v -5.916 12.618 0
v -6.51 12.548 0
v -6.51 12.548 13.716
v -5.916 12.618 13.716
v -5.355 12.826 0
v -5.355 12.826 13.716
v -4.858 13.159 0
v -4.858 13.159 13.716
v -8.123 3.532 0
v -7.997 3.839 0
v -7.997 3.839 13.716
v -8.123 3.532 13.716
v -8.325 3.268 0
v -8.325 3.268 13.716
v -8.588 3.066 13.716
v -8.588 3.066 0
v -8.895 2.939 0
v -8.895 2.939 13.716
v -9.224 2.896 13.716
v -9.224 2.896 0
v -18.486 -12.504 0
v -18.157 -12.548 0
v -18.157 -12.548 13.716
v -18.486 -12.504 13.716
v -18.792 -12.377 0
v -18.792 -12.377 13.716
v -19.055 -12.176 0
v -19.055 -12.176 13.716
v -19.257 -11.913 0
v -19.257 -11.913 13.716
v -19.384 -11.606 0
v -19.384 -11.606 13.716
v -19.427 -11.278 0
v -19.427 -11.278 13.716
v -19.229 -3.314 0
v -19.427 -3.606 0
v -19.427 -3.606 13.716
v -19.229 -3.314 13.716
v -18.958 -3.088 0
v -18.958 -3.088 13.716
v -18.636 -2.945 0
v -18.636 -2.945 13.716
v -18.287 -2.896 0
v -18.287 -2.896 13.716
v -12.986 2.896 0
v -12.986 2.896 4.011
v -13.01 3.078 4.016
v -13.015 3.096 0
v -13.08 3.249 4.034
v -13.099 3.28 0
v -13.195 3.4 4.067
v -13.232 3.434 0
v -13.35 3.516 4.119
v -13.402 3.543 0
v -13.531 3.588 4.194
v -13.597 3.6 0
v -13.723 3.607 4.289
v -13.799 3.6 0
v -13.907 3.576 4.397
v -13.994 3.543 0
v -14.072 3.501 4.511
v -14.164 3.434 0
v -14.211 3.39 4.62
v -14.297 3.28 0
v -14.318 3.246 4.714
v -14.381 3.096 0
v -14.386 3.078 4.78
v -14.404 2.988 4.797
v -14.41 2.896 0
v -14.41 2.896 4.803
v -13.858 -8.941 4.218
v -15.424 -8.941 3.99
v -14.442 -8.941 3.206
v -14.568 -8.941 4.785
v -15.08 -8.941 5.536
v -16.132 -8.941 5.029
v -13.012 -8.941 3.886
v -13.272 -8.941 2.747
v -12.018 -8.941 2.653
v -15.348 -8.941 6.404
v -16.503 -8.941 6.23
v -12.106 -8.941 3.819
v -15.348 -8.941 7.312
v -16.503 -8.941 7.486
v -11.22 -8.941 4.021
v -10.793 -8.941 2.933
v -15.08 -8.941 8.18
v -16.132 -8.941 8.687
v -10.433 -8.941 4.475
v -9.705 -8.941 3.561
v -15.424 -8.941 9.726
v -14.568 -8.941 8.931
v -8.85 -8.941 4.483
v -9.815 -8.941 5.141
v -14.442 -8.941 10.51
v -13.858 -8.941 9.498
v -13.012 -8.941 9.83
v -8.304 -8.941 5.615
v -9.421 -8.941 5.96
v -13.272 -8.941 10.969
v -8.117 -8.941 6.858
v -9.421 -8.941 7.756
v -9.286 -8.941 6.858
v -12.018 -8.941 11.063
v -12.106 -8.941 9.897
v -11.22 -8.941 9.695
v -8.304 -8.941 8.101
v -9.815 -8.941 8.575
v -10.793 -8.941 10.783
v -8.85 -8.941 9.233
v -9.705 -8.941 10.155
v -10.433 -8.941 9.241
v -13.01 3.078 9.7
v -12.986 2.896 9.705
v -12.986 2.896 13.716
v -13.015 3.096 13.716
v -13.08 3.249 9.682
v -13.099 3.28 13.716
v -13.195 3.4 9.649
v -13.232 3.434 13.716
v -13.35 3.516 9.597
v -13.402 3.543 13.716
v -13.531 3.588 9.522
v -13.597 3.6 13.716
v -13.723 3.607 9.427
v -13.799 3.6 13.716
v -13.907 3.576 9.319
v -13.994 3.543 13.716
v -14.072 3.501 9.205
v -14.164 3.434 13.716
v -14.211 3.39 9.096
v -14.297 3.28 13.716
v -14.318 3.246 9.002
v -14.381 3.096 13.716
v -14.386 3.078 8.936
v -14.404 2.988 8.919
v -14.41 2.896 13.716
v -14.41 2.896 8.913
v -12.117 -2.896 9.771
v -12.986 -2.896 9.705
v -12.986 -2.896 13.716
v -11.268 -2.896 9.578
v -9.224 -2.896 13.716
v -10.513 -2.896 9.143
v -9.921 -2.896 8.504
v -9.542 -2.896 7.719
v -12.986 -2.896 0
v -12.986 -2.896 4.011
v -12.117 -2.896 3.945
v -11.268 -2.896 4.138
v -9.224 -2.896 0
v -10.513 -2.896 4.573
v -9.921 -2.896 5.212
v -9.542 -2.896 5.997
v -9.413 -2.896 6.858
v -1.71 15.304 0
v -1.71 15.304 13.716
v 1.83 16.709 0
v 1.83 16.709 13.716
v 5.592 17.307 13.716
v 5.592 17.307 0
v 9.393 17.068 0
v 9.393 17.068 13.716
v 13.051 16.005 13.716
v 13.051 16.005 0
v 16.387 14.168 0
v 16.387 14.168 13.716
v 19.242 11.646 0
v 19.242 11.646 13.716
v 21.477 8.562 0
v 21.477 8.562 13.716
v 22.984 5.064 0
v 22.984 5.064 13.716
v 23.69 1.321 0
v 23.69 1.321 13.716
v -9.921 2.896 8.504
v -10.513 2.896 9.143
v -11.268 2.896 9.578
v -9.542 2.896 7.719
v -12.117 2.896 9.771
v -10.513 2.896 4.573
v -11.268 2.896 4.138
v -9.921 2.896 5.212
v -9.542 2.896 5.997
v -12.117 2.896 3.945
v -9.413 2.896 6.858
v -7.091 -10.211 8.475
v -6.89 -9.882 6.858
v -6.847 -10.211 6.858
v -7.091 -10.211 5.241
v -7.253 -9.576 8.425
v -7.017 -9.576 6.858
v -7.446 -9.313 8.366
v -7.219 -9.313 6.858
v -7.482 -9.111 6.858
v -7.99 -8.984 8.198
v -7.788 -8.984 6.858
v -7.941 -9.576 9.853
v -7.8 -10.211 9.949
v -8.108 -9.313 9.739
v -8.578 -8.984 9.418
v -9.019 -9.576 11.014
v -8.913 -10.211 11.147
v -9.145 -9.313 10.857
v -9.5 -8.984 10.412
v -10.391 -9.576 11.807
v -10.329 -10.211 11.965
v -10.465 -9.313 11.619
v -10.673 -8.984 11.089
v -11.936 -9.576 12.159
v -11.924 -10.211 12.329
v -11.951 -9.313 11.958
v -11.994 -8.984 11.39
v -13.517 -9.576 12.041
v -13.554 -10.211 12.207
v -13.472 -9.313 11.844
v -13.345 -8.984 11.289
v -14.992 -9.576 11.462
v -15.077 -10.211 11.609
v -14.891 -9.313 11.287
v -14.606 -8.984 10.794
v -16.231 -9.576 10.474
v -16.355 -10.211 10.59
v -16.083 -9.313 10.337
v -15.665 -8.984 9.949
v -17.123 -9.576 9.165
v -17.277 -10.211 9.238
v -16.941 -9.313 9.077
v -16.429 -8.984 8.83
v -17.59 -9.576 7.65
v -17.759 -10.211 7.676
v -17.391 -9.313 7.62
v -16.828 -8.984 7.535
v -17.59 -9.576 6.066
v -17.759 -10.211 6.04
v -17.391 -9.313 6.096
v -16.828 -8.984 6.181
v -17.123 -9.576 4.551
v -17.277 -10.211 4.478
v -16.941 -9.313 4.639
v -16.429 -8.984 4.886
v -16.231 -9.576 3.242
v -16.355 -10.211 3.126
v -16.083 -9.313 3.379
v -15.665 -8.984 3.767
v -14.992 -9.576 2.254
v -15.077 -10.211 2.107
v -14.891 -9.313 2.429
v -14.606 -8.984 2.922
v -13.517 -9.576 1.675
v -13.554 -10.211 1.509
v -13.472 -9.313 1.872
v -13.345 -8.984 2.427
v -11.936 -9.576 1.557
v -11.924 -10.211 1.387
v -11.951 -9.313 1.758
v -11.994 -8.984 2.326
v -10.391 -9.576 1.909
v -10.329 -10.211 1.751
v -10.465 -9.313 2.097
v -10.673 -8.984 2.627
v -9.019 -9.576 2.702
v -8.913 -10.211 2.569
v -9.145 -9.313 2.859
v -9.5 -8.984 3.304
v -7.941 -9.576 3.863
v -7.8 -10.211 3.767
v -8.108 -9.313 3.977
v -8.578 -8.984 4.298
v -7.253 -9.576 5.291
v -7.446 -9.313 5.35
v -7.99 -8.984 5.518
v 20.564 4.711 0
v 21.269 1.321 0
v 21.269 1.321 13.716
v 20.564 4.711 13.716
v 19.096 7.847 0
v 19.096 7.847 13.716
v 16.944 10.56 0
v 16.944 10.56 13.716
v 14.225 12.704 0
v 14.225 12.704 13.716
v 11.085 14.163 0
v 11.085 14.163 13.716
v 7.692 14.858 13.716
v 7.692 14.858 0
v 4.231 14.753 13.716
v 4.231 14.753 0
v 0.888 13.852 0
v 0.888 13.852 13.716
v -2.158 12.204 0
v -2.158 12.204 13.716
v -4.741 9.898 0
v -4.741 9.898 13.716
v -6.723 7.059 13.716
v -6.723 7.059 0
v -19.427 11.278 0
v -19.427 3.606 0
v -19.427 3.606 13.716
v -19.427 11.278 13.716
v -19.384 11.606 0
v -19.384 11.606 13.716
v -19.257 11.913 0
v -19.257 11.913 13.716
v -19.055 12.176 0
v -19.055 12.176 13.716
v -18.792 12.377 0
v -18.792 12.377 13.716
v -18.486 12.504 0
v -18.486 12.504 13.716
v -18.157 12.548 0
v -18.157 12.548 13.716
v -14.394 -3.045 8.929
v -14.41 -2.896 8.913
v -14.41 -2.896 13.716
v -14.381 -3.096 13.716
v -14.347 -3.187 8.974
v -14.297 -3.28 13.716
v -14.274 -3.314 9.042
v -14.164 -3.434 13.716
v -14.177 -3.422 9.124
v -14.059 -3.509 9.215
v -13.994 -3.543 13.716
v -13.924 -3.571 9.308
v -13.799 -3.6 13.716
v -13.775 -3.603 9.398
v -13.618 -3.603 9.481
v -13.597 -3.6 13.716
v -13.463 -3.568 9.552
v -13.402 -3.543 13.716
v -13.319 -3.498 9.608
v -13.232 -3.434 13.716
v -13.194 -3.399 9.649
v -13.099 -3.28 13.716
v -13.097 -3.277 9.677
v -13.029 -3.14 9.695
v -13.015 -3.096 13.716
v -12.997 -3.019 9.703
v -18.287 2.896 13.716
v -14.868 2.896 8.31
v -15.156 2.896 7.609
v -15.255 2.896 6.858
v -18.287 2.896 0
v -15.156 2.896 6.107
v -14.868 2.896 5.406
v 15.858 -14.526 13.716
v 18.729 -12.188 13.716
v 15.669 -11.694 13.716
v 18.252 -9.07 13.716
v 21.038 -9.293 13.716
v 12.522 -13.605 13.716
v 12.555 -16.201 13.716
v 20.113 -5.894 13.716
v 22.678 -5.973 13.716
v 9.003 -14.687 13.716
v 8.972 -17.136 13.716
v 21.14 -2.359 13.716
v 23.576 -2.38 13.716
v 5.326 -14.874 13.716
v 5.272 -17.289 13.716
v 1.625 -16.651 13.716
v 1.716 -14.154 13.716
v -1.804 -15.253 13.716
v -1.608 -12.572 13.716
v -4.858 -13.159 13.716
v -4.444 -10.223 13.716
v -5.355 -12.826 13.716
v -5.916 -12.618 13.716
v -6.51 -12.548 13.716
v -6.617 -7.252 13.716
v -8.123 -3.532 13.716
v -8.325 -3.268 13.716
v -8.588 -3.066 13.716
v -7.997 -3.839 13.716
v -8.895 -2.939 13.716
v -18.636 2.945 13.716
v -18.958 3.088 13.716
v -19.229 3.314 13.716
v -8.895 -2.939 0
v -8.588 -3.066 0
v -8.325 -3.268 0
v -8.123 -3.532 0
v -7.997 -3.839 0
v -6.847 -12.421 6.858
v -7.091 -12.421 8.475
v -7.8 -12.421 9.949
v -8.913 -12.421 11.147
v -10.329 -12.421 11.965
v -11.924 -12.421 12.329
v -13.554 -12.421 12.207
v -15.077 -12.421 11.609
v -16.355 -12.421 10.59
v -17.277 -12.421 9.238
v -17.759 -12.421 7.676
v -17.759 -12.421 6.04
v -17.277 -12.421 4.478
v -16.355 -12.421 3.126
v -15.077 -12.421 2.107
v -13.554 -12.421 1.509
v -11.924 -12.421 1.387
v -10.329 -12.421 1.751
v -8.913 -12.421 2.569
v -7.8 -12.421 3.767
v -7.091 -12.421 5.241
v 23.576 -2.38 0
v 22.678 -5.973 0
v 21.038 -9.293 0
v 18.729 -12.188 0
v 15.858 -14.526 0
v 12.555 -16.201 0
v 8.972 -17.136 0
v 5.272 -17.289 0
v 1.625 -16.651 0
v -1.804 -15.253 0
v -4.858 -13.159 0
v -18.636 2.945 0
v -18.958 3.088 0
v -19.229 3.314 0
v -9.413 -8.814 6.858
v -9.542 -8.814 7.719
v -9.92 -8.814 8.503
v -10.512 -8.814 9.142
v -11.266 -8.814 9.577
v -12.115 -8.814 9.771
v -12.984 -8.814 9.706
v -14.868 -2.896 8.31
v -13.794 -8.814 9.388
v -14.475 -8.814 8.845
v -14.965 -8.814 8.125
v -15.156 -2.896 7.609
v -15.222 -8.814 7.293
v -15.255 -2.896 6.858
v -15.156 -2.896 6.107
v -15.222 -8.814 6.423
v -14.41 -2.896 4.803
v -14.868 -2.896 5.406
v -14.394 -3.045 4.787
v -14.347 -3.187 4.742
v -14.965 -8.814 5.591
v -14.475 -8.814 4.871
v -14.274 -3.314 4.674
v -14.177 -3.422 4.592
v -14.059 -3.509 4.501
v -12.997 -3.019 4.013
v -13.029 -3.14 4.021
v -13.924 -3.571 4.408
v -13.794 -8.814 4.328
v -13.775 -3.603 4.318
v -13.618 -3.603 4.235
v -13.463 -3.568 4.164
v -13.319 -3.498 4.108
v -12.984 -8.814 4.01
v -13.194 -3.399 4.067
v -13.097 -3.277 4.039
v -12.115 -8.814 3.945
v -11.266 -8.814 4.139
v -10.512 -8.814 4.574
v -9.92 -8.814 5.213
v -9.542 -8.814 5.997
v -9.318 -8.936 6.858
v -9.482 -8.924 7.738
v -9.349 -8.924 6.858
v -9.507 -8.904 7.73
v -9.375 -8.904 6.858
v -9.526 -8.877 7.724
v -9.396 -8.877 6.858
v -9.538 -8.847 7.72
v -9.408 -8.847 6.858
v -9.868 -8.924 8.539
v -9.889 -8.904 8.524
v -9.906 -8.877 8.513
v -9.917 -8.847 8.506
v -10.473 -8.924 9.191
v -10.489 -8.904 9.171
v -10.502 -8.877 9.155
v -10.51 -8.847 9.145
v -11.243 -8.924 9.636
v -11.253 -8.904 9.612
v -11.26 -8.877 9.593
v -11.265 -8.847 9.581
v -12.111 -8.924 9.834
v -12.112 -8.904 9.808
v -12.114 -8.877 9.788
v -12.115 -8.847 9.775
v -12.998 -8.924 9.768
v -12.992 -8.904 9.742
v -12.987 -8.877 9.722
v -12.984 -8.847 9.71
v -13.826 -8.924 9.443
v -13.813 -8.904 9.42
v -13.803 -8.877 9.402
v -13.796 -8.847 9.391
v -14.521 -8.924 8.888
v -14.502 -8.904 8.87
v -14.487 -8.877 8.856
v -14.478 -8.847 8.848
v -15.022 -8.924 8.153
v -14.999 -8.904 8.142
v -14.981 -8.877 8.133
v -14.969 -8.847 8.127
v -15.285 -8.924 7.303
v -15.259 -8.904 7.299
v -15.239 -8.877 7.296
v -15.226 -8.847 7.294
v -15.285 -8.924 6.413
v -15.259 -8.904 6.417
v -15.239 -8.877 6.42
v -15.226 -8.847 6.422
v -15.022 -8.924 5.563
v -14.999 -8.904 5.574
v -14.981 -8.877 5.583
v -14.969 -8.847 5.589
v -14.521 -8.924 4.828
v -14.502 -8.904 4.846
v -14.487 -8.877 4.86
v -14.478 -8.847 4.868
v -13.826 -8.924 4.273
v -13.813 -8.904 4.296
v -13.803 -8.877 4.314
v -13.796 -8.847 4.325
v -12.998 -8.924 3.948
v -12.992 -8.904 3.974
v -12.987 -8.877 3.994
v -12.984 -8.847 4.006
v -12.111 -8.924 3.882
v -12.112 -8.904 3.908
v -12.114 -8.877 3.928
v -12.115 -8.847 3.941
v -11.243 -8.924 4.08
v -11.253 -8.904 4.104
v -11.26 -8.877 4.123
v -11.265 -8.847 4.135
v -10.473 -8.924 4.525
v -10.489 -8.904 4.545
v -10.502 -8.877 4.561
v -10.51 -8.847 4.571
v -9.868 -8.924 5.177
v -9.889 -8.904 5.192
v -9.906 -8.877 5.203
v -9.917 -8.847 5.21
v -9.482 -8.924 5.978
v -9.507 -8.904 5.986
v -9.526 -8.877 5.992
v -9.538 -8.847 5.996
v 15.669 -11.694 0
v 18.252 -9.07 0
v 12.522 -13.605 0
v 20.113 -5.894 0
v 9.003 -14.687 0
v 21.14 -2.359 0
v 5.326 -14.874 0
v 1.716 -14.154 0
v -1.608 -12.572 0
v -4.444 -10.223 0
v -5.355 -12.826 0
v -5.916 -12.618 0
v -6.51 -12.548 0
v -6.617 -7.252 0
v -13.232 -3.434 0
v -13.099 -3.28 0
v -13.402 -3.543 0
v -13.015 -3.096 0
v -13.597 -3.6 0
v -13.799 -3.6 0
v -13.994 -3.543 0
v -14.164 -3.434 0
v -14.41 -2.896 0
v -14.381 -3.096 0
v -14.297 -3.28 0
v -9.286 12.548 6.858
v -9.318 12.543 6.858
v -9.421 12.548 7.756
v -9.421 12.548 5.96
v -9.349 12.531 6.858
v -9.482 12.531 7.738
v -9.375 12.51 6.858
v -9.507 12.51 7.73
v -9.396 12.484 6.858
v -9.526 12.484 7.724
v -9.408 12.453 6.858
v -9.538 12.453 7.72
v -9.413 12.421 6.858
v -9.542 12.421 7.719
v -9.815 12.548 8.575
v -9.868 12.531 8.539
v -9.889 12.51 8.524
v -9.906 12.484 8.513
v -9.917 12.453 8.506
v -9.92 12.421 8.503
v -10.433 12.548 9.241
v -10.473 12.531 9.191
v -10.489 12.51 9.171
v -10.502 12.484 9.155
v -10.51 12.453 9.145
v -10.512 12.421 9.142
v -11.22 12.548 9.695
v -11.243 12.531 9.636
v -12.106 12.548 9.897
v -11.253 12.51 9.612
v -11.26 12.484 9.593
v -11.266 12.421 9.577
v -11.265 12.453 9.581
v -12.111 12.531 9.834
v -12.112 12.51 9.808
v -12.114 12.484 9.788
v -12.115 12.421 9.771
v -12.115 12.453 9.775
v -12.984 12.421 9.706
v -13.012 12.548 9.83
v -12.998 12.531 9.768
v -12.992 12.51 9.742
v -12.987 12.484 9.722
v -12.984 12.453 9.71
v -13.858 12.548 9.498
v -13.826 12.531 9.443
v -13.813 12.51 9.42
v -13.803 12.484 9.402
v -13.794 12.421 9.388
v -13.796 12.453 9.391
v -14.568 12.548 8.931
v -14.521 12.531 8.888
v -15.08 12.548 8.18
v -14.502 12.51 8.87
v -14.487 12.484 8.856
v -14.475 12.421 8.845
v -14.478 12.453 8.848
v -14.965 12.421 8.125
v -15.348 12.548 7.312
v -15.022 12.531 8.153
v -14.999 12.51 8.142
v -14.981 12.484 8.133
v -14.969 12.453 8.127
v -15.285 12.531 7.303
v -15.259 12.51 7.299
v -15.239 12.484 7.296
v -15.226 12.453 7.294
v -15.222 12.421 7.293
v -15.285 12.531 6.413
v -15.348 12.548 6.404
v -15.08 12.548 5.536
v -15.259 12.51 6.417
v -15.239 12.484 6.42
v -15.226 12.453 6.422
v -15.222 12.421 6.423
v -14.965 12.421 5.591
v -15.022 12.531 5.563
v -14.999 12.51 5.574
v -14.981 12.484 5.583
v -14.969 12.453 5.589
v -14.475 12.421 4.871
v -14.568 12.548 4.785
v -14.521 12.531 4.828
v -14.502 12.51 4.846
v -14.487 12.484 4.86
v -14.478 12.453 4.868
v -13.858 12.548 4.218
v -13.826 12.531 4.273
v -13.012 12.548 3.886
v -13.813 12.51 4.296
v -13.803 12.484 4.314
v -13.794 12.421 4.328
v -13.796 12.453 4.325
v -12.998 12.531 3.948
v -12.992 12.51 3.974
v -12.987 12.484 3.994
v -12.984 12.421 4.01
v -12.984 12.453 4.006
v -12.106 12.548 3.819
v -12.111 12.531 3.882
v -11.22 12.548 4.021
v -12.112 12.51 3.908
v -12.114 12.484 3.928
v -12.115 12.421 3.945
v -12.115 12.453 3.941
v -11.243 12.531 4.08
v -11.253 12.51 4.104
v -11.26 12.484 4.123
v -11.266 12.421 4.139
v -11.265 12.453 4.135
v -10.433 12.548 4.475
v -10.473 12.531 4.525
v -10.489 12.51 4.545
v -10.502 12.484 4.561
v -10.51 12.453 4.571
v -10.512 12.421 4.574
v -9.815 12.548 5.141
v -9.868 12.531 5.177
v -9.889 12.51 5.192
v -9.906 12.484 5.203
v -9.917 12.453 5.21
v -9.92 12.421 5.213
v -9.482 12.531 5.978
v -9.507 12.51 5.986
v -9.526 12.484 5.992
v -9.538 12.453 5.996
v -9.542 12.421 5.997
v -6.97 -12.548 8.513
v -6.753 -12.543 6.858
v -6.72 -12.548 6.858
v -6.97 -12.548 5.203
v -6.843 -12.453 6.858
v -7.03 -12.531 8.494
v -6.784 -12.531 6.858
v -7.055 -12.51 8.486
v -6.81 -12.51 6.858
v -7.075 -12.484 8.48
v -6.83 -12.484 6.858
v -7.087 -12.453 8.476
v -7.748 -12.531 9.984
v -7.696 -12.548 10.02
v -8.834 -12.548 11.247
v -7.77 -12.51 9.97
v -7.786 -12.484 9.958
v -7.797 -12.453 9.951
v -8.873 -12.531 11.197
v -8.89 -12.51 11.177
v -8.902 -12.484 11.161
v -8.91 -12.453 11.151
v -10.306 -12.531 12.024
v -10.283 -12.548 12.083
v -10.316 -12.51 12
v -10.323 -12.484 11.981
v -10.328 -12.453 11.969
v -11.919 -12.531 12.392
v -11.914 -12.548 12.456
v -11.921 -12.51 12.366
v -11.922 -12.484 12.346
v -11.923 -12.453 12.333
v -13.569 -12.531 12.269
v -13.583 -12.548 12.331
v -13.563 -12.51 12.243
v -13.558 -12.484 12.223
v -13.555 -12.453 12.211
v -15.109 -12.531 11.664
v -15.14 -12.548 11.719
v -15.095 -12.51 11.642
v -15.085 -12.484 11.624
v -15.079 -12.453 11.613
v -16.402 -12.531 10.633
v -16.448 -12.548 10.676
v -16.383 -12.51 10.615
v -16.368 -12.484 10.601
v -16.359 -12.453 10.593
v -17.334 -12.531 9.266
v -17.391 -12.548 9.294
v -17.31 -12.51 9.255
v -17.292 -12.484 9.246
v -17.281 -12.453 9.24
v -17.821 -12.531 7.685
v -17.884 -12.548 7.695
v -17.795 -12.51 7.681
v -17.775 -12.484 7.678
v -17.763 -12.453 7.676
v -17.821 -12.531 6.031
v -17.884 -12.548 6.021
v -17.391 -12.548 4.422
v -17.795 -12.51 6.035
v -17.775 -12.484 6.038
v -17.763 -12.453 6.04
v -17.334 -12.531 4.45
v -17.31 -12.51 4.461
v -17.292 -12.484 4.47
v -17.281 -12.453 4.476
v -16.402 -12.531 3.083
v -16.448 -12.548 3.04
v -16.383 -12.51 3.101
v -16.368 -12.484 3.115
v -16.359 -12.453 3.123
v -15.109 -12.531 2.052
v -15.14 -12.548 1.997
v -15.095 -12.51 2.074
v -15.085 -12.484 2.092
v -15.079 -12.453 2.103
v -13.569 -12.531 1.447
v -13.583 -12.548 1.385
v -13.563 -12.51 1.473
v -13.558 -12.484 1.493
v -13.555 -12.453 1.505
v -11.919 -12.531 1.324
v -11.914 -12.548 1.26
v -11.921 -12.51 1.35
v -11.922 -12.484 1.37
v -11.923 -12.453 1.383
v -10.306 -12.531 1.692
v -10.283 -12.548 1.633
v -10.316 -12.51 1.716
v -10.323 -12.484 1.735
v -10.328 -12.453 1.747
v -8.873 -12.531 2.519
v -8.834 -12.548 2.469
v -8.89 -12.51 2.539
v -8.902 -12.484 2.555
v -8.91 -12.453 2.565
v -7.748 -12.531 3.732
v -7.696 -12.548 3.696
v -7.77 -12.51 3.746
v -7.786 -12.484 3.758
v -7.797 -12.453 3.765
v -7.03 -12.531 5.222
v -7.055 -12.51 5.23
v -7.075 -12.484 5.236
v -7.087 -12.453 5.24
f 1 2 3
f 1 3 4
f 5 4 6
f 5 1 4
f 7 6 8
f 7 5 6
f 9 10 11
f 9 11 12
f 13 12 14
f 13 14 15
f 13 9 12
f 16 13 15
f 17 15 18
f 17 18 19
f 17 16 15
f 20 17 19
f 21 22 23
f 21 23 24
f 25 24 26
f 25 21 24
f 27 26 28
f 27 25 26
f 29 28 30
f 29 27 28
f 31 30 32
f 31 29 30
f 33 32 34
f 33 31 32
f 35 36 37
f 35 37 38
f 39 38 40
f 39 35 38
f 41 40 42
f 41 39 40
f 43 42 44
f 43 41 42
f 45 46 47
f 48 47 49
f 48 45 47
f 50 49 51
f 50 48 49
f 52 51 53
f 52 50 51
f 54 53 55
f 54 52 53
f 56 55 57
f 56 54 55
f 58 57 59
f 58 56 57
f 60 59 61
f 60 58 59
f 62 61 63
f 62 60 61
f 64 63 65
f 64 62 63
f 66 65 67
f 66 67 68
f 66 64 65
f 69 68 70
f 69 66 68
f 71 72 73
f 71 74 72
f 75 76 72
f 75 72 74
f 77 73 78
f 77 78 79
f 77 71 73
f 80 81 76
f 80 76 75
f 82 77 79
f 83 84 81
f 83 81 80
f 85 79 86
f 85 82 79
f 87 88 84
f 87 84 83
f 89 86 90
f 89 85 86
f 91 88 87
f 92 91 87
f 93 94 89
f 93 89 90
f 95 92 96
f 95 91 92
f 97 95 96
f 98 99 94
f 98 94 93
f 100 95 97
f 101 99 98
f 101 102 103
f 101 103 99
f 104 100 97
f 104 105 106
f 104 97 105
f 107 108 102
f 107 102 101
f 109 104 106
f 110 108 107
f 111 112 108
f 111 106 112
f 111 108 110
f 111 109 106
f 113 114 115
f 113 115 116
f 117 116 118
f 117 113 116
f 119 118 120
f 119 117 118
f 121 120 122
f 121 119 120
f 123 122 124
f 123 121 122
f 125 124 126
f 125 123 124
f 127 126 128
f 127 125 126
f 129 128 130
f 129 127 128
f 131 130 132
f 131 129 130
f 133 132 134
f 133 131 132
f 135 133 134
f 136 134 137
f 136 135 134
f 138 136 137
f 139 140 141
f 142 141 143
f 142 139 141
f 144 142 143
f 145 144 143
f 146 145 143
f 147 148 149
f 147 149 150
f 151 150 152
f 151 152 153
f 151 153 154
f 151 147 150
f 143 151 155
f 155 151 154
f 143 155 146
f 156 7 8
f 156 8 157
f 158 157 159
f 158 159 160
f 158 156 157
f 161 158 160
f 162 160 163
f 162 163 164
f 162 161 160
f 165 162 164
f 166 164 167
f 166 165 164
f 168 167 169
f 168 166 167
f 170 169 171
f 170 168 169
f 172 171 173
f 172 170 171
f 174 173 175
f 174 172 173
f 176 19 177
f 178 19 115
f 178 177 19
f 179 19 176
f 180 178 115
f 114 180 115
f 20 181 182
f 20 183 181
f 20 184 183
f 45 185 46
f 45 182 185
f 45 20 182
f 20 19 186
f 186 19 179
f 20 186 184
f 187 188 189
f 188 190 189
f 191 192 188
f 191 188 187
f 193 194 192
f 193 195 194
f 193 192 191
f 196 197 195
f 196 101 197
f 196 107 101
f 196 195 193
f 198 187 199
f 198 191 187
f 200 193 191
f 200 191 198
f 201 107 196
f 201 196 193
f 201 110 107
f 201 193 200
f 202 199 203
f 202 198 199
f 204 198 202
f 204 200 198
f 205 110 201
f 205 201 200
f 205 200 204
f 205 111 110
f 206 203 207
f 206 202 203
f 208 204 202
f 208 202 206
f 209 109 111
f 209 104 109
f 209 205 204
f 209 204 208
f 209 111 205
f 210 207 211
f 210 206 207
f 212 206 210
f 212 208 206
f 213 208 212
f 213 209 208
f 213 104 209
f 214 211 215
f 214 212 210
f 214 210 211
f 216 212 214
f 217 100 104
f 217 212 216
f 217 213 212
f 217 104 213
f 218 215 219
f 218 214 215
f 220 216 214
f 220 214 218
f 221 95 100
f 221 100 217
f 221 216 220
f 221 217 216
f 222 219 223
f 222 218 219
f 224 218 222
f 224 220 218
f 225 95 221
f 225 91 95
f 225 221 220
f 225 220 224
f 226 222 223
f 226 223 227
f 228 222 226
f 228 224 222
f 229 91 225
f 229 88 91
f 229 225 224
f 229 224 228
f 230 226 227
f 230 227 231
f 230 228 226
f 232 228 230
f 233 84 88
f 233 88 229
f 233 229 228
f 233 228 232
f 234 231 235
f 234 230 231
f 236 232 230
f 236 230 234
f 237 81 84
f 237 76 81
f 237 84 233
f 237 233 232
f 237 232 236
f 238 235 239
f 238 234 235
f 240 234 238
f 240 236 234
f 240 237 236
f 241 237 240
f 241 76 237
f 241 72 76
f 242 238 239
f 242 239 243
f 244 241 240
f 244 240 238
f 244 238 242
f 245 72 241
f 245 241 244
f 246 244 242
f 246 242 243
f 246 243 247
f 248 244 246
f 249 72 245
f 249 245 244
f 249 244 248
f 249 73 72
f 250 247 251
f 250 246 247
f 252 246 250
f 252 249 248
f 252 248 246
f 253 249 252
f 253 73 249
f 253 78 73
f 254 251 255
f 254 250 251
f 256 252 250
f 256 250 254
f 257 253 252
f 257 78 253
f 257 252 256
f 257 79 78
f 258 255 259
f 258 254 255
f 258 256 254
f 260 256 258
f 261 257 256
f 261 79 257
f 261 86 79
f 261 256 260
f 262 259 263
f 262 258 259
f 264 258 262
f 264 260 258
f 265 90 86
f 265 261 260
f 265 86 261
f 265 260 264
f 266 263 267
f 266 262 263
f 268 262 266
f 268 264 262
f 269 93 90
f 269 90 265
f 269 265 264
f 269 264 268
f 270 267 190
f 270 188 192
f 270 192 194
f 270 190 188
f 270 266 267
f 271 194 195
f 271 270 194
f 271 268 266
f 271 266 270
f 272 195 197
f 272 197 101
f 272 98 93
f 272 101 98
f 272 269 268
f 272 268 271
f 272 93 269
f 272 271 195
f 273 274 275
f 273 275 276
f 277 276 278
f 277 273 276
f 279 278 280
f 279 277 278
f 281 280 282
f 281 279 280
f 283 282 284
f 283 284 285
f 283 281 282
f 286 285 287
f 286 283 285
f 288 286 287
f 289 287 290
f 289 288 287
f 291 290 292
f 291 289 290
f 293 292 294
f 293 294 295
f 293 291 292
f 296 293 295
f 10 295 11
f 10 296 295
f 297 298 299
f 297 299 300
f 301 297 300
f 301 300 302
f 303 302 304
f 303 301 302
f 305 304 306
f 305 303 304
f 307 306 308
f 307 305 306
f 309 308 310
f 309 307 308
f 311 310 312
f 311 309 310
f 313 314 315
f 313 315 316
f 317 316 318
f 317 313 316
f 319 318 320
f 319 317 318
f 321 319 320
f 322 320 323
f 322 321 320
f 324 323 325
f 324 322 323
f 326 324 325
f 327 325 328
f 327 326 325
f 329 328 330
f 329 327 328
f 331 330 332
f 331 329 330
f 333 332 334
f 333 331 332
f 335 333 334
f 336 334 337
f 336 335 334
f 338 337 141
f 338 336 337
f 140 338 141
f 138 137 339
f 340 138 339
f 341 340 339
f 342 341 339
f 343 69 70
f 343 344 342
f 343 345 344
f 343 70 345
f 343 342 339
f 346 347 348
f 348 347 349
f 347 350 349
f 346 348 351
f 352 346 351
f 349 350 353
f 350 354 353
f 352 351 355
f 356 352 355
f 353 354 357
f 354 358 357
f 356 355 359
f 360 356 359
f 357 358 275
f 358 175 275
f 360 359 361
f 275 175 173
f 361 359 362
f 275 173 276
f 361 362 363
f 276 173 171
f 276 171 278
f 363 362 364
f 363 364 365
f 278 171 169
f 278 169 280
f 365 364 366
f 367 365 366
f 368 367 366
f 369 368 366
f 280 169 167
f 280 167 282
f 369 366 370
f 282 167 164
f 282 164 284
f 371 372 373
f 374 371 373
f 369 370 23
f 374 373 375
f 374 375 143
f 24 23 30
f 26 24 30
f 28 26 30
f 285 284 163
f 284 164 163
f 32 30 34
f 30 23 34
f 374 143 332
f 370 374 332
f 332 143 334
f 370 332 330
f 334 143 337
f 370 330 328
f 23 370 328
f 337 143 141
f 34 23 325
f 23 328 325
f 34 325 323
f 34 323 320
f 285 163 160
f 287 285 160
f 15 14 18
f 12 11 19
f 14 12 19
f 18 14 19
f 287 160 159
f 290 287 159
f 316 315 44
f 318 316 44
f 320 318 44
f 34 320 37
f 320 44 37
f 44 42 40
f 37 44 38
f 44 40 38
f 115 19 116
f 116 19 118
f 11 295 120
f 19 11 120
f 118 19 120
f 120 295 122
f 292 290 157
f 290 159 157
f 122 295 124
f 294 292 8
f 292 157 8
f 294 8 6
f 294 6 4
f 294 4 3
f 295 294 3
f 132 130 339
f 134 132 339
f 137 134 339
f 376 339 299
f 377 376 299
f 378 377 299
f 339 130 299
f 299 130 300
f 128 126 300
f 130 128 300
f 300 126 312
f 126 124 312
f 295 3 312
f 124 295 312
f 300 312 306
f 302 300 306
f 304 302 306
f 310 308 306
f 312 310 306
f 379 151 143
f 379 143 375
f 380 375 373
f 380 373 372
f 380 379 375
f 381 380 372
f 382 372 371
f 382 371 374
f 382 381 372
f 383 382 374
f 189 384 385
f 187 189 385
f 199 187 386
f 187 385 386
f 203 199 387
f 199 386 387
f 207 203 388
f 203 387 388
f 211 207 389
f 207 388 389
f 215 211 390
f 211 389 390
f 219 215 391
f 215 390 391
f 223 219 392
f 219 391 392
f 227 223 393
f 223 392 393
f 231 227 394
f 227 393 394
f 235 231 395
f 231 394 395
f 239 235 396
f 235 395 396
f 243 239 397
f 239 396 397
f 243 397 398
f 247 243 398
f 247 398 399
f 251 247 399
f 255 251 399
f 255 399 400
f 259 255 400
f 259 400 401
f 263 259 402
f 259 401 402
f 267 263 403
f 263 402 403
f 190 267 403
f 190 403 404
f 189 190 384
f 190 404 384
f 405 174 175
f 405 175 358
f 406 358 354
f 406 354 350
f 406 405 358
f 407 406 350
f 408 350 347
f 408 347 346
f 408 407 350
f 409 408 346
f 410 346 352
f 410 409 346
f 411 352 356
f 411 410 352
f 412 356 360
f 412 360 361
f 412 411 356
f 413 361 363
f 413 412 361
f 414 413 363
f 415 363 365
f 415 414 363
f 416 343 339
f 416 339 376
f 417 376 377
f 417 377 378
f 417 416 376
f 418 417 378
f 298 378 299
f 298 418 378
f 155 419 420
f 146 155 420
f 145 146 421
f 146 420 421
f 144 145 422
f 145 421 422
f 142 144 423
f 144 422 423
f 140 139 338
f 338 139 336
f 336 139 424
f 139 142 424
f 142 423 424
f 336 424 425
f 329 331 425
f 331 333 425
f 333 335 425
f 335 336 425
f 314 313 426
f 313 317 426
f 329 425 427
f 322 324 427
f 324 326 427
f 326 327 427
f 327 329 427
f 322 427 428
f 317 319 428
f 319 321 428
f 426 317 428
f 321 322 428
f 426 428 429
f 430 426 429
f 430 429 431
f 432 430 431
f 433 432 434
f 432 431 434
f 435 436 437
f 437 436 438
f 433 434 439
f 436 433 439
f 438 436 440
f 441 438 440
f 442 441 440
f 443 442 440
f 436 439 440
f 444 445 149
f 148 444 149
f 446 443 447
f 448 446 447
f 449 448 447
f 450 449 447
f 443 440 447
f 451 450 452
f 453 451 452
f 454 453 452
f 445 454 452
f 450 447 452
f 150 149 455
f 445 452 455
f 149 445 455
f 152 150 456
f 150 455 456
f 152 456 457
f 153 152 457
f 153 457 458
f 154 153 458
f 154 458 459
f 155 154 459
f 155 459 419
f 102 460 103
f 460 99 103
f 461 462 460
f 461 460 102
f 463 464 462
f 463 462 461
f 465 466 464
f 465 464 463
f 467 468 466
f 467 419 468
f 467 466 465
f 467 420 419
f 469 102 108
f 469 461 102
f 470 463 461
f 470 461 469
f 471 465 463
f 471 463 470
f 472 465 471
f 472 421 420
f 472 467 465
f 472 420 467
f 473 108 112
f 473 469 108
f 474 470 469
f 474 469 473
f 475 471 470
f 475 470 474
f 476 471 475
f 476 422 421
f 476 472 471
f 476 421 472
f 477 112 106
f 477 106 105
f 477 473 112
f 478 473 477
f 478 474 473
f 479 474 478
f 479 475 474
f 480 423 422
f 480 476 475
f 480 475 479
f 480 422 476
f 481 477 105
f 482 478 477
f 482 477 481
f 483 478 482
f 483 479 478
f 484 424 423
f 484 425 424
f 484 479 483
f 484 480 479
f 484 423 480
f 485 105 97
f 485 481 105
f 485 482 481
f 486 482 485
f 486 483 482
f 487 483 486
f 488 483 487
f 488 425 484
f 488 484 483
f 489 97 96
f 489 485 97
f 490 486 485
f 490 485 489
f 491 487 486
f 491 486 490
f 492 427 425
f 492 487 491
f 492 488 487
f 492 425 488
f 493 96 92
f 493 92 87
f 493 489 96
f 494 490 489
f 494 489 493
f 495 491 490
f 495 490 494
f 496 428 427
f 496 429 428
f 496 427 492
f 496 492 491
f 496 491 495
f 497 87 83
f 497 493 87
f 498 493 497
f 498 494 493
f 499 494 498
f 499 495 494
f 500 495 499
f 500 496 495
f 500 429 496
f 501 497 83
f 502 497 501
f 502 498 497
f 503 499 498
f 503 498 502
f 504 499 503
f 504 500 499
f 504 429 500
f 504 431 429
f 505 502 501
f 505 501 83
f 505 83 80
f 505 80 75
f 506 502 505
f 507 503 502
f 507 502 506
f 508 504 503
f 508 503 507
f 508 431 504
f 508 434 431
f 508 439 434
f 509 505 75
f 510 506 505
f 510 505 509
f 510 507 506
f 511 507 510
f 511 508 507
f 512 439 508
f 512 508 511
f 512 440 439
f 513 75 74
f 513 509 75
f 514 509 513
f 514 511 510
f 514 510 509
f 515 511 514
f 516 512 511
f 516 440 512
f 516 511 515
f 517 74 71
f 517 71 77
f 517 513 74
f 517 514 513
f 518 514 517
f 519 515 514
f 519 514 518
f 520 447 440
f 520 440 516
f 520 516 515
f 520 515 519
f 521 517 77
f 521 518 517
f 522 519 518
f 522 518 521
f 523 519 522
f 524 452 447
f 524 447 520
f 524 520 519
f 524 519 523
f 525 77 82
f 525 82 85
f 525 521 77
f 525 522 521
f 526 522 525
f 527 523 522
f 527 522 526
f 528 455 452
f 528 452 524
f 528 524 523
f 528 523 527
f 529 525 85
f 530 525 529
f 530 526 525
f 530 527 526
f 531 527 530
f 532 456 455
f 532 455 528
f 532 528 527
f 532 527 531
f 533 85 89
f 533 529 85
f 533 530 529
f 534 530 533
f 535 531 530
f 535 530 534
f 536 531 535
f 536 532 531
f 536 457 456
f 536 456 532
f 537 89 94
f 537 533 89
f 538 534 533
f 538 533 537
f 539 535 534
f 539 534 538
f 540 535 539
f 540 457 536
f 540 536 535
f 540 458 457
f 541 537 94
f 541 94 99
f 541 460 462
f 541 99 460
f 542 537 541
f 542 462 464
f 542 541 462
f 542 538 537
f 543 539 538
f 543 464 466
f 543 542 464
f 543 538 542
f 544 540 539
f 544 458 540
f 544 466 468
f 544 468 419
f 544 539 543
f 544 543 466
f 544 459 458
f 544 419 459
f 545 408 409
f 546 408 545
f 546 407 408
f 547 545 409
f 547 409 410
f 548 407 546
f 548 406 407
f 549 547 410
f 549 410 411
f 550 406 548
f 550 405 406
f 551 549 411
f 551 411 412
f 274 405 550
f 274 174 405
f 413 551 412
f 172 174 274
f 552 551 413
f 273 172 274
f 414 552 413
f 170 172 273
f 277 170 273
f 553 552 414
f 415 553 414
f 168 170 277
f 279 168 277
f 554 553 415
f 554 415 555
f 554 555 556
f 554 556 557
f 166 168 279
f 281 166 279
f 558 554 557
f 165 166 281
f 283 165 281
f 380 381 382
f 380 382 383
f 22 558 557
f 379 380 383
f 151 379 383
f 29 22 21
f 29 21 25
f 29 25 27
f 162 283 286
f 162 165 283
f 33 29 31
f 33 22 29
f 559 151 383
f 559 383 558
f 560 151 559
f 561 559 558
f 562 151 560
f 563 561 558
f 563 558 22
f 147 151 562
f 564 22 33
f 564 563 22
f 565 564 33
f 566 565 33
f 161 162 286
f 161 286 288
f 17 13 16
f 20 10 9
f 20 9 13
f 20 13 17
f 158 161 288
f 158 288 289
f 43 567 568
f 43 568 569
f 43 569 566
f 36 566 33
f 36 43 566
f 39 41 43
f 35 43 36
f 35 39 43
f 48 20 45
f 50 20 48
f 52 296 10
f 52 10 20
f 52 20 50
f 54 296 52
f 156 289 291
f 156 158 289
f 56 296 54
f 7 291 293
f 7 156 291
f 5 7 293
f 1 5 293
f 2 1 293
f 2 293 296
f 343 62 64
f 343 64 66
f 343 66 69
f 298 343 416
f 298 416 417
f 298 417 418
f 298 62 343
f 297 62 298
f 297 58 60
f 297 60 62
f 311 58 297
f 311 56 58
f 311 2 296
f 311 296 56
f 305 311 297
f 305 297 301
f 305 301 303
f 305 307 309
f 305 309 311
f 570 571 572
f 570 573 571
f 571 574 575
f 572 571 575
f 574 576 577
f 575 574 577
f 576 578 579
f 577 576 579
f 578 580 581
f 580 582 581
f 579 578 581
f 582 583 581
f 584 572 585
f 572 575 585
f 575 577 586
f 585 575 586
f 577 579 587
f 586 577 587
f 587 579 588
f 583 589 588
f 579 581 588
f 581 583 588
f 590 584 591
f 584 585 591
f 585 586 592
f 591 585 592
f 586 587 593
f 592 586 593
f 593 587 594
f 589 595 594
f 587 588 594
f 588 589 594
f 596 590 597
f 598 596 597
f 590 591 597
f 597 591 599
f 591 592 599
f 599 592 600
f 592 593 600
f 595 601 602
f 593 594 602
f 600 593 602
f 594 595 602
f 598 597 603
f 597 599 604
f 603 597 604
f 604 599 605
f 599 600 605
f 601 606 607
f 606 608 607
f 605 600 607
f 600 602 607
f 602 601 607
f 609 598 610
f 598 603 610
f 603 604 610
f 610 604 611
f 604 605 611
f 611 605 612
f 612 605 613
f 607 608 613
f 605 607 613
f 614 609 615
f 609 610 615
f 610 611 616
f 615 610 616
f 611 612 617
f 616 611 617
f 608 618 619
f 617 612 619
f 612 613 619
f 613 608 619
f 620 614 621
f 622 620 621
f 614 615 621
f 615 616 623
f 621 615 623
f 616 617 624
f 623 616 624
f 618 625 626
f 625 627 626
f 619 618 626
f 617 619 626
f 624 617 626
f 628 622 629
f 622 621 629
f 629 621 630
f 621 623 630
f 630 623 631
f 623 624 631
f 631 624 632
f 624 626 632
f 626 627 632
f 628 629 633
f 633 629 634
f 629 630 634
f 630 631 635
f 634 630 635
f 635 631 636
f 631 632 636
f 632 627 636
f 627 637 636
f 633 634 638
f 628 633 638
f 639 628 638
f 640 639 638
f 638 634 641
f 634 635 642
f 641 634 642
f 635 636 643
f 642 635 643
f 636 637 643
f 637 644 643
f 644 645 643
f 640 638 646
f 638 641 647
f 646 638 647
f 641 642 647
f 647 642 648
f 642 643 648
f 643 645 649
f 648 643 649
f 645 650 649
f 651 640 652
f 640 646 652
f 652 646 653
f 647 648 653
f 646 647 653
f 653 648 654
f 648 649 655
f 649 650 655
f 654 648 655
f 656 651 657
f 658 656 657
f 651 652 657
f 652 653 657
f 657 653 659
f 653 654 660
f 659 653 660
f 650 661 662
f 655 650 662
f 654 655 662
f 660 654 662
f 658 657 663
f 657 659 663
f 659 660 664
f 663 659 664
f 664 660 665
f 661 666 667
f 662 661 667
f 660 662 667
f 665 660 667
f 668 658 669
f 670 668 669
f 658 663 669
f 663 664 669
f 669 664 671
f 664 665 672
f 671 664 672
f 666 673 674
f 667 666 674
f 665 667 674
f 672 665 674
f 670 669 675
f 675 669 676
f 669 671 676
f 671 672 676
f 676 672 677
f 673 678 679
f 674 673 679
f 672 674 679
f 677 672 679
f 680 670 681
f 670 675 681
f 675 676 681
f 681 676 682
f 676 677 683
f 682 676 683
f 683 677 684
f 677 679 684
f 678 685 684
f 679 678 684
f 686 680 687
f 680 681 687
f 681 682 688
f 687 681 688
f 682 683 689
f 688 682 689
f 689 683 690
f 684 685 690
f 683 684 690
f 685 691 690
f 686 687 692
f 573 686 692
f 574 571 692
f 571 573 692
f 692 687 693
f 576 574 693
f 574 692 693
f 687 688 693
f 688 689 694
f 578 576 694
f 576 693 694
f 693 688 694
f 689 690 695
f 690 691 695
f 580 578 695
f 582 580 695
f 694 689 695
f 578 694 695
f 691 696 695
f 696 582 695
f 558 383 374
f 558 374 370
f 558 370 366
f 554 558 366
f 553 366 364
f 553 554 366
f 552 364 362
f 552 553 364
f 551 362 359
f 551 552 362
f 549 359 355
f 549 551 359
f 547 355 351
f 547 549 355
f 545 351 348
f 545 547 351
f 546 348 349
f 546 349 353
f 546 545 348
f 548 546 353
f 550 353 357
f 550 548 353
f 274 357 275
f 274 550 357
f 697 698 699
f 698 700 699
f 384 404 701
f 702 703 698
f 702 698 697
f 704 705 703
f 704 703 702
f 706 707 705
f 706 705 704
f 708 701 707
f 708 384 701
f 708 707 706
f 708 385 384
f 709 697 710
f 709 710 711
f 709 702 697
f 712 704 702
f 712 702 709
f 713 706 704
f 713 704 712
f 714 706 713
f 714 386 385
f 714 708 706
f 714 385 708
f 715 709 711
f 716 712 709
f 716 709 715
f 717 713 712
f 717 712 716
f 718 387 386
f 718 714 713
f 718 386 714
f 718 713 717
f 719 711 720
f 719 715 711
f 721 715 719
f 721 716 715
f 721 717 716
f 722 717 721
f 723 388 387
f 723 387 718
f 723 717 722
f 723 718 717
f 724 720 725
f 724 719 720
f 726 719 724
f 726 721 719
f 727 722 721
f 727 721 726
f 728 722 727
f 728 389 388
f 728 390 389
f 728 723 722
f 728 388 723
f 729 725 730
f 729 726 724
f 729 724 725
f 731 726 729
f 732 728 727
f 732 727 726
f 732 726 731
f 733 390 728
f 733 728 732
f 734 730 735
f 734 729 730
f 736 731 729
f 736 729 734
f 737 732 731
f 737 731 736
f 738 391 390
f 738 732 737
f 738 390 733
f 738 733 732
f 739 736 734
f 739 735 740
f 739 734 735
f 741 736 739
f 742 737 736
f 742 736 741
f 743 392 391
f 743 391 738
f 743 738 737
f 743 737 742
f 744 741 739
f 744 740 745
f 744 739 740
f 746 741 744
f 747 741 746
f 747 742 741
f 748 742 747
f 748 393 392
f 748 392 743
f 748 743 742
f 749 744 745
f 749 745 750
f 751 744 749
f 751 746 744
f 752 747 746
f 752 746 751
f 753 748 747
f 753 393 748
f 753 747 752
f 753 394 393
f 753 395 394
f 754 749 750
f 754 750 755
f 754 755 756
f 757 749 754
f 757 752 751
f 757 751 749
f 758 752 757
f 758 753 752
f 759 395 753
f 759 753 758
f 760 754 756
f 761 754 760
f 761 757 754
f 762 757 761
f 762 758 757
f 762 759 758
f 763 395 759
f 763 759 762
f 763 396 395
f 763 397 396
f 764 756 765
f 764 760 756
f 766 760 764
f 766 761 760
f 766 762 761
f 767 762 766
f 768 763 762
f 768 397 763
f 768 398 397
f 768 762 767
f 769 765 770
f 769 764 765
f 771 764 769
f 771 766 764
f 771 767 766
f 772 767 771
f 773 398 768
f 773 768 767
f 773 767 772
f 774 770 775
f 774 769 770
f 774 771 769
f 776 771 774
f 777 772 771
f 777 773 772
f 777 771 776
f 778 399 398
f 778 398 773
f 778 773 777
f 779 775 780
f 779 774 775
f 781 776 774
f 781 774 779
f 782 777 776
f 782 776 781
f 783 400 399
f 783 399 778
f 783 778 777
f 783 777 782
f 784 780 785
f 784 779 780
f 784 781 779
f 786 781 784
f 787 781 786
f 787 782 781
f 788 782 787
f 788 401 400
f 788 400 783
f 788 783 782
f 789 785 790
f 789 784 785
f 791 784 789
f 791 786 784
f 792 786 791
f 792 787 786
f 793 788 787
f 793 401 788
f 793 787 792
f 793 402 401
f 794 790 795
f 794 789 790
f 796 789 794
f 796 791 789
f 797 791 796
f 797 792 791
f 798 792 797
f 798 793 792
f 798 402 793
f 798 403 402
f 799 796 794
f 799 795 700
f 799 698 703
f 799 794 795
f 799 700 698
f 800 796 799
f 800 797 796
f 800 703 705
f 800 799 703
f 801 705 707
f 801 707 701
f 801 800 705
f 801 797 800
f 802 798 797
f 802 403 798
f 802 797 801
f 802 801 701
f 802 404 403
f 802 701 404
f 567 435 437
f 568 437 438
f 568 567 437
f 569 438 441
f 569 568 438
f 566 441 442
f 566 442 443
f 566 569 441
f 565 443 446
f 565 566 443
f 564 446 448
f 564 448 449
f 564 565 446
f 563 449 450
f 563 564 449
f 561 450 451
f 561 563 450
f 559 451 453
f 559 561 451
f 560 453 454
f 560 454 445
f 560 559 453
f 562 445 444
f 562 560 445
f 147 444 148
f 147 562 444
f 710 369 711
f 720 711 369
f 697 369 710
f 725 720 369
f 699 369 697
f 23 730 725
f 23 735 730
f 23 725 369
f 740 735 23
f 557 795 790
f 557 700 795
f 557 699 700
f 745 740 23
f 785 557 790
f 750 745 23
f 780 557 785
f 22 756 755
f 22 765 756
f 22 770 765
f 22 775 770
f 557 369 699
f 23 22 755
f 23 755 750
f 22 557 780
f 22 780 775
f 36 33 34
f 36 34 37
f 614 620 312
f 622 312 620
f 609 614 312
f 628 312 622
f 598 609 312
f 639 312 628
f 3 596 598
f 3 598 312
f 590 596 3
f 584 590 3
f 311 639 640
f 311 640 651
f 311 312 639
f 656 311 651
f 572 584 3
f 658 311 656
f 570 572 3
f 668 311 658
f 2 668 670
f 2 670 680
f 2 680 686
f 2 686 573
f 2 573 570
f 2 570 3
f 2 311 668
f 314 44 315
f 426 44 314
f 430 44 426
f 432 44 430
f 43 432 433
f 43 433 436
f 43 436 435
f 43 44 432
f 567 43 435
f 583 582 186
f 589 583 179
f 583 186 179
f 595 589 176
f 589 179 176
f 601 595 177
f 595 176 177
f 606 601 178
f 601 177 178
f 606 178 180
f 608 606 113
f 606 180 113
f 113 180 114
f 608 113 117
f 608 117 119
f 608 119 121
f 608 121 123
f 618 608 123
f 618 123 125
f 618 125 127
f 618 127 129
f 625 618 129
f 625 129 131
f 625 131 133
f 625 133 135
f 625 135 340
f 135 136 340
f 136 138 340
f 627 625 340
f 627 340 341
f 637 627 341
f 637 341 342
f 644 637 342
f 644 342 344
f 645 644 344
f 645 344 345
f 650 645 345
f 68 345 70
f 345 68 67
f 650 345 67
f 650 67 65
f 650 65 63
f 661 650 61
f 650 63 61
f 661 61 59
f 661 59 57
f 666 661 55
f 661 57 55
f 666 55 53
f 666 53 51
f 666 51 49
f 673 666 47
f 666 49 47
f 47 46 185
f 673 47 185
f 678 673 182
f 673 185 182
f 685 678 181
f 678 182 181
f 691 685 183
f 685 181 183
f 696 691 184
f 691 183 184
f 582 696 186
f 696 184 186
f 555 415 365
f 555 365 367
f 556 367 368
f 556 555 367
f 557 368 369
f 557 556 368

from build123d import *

# Parameters (mm, degrees)
BOSS_EXTRUDE1_DEPTH = 13.716
SKETCH2_R           = 5.4864
CUT_EXTRUDE1_DEPTH  = 3.6068
SKETCH3_R           = 2.921
CUT_EXTRUDE2_DEPTH  = 27.267149632
FILLET1_R           = 0.127
FILLET2_R           = 0.127
FILLET3_R           = 1.27
FILLET4_R           = 0.127


with BuildPart() as part:
    # Sketch1 → Boss-Extrude1 (new body)
    with BuildSketch(Plane.XY):
        with BuildLine():
            Line((-18.286658229, -2.8956), (-14.409782184, -2.8956))
            ThreePointArc((-14.409782184, -2.8956), (-13.697921632, -3.607460552), (-12.986061079, -2.8956))
            Line((-12.986061079, -2.8956), (-9.224054916, -2.8956))
            ThreePointArc((-9.224054916, -2.8956), (-8.450188338, -3.158609176), (-7.996847762, -3.838701544))
            ThreePointArc((-7.996847762, -3.838701544), (9.003275389, -14.686851959), (21.268740456, 1.3208))
            ThreePointArc((21.268740456, 1.3208), (7.692360315, 14.858458112), (-7.996847762, 3.838701544))
            ThreePointArc((-7.996847762, 3.838701544), (-8.450188338, 3.158609176), (-9.224054916, 2.8956))
            Line((-9.224054916, 2.8956), (-12.986061079, 2.8956))
            ThreePointArc((-12.986061079, 2.8956), (-13.697921632, 3.607460552), (-14.409782184, 2.8956))
            Line((-14.409782184, 2.8956), (-18.286658229, 2.8956))
            ThreePointArc((-18.286658229, 2.8956), (-18.958421102, 3.087808442), (-19.426847762, 3.606254106))
            Line((-19.426847762, 3.606254106), (-19.426847762, 11.2776))
            ThreePointArc((-19.426847762, 11.2776), (-19.054873374, 12.175625612), (-18.156847762, 12.5476))
            Line((-18.156847762, 12.5476), (-6.510253262, 12.5476))
            ThreePointArc((-6.510253262, 12.5476), (-5.629373118, 12.705237691), (-4.857831488, 13.158584116))
            ThreePointArc((-4.857831488, 13.158584116), (13.050680986, 16.004898652), (23.689927776, 1.3208))
            ThreePointArc((23.689927776, 1.3208), (14.251434441, -15.452408322), (-4.857831488, -13.158584116))
            ThreePointArc((-4.857831488, -13.158584116), (-5.629373118, -12.705237691), (-6.510253262, -12.5476))
            Line((-6.510253262, -12.5476), (-18.156847762, -12.5476))
            ThreePointArc((-18.156847762, -12.5476), (-19.054873374, -12.175625612), (-19.426847762, -11.2776))
            Line((-19.426847762, -11.2776), (-19.426847762, -3.606254106))
            ThreePointArc((-19.426847762, -3.606254106), (-18.958421102, -3.087808442), (-18.286658229, -2.8956))
        make_face()
    extrude(amount=BOSS_EXTRUDE1_DEPTH)

    # Sketch2 → Cut-Extrude1 (cut)
    with BuildSketch(Plane.XZ.offset(12.5476)):
        with Locations((-12.333550512, 6.858)):
            Circle(SKETCH2_R)
    extrude(amount=-CUT_EXTRUDE1_DEPTH, mode=Mode.SUBTRACT)

    # Sketch3 → Cut-Extrude2 (cut, through all)
    with BuildSketch(Plane.XZ.offset(8.9408)):
        with Locations((-12.333550512, 6.858)):
            Circle(SKETCH3_R)
    extrude(amount=-CUT_EXTRUDE2_DEPTH, mode=Mode.SUBTRACT)

    # Fillet1
    fillet1_edges = [part.edges().sort_by_distance(p)[0] for p in [
        (-15.254550512, 12.5476, 6.858),
    ]]
    fillet(fillet1_edges, radius=FILLET1_R)

    # Fillet2
    fillet2_edges = [part.edges().sort_by_distance(p)[0] for p in [
        (-17.819950512, -12.5476, 6.858),
    ]]
    fillet(fillet2_edges, radius=FILLET2_R)

    # Fillet3
    fillet3_edges = [part.edges().sort_by_distance(p)[0] for p in [
        (-17.819950512, -8.9408, 6.858),
    ]]
    fillet(fillet3_edges, radius=FILLET3_R)

    # Fillet4
    fillet4_edges = [part.edges().sort_by_distance(p)[0] for p in [
        (-15.254550512, -8.9408, 6.858),
    ]]
    fillet(fillet4_edges, radius=FILLET4_R)


solid = part.part
